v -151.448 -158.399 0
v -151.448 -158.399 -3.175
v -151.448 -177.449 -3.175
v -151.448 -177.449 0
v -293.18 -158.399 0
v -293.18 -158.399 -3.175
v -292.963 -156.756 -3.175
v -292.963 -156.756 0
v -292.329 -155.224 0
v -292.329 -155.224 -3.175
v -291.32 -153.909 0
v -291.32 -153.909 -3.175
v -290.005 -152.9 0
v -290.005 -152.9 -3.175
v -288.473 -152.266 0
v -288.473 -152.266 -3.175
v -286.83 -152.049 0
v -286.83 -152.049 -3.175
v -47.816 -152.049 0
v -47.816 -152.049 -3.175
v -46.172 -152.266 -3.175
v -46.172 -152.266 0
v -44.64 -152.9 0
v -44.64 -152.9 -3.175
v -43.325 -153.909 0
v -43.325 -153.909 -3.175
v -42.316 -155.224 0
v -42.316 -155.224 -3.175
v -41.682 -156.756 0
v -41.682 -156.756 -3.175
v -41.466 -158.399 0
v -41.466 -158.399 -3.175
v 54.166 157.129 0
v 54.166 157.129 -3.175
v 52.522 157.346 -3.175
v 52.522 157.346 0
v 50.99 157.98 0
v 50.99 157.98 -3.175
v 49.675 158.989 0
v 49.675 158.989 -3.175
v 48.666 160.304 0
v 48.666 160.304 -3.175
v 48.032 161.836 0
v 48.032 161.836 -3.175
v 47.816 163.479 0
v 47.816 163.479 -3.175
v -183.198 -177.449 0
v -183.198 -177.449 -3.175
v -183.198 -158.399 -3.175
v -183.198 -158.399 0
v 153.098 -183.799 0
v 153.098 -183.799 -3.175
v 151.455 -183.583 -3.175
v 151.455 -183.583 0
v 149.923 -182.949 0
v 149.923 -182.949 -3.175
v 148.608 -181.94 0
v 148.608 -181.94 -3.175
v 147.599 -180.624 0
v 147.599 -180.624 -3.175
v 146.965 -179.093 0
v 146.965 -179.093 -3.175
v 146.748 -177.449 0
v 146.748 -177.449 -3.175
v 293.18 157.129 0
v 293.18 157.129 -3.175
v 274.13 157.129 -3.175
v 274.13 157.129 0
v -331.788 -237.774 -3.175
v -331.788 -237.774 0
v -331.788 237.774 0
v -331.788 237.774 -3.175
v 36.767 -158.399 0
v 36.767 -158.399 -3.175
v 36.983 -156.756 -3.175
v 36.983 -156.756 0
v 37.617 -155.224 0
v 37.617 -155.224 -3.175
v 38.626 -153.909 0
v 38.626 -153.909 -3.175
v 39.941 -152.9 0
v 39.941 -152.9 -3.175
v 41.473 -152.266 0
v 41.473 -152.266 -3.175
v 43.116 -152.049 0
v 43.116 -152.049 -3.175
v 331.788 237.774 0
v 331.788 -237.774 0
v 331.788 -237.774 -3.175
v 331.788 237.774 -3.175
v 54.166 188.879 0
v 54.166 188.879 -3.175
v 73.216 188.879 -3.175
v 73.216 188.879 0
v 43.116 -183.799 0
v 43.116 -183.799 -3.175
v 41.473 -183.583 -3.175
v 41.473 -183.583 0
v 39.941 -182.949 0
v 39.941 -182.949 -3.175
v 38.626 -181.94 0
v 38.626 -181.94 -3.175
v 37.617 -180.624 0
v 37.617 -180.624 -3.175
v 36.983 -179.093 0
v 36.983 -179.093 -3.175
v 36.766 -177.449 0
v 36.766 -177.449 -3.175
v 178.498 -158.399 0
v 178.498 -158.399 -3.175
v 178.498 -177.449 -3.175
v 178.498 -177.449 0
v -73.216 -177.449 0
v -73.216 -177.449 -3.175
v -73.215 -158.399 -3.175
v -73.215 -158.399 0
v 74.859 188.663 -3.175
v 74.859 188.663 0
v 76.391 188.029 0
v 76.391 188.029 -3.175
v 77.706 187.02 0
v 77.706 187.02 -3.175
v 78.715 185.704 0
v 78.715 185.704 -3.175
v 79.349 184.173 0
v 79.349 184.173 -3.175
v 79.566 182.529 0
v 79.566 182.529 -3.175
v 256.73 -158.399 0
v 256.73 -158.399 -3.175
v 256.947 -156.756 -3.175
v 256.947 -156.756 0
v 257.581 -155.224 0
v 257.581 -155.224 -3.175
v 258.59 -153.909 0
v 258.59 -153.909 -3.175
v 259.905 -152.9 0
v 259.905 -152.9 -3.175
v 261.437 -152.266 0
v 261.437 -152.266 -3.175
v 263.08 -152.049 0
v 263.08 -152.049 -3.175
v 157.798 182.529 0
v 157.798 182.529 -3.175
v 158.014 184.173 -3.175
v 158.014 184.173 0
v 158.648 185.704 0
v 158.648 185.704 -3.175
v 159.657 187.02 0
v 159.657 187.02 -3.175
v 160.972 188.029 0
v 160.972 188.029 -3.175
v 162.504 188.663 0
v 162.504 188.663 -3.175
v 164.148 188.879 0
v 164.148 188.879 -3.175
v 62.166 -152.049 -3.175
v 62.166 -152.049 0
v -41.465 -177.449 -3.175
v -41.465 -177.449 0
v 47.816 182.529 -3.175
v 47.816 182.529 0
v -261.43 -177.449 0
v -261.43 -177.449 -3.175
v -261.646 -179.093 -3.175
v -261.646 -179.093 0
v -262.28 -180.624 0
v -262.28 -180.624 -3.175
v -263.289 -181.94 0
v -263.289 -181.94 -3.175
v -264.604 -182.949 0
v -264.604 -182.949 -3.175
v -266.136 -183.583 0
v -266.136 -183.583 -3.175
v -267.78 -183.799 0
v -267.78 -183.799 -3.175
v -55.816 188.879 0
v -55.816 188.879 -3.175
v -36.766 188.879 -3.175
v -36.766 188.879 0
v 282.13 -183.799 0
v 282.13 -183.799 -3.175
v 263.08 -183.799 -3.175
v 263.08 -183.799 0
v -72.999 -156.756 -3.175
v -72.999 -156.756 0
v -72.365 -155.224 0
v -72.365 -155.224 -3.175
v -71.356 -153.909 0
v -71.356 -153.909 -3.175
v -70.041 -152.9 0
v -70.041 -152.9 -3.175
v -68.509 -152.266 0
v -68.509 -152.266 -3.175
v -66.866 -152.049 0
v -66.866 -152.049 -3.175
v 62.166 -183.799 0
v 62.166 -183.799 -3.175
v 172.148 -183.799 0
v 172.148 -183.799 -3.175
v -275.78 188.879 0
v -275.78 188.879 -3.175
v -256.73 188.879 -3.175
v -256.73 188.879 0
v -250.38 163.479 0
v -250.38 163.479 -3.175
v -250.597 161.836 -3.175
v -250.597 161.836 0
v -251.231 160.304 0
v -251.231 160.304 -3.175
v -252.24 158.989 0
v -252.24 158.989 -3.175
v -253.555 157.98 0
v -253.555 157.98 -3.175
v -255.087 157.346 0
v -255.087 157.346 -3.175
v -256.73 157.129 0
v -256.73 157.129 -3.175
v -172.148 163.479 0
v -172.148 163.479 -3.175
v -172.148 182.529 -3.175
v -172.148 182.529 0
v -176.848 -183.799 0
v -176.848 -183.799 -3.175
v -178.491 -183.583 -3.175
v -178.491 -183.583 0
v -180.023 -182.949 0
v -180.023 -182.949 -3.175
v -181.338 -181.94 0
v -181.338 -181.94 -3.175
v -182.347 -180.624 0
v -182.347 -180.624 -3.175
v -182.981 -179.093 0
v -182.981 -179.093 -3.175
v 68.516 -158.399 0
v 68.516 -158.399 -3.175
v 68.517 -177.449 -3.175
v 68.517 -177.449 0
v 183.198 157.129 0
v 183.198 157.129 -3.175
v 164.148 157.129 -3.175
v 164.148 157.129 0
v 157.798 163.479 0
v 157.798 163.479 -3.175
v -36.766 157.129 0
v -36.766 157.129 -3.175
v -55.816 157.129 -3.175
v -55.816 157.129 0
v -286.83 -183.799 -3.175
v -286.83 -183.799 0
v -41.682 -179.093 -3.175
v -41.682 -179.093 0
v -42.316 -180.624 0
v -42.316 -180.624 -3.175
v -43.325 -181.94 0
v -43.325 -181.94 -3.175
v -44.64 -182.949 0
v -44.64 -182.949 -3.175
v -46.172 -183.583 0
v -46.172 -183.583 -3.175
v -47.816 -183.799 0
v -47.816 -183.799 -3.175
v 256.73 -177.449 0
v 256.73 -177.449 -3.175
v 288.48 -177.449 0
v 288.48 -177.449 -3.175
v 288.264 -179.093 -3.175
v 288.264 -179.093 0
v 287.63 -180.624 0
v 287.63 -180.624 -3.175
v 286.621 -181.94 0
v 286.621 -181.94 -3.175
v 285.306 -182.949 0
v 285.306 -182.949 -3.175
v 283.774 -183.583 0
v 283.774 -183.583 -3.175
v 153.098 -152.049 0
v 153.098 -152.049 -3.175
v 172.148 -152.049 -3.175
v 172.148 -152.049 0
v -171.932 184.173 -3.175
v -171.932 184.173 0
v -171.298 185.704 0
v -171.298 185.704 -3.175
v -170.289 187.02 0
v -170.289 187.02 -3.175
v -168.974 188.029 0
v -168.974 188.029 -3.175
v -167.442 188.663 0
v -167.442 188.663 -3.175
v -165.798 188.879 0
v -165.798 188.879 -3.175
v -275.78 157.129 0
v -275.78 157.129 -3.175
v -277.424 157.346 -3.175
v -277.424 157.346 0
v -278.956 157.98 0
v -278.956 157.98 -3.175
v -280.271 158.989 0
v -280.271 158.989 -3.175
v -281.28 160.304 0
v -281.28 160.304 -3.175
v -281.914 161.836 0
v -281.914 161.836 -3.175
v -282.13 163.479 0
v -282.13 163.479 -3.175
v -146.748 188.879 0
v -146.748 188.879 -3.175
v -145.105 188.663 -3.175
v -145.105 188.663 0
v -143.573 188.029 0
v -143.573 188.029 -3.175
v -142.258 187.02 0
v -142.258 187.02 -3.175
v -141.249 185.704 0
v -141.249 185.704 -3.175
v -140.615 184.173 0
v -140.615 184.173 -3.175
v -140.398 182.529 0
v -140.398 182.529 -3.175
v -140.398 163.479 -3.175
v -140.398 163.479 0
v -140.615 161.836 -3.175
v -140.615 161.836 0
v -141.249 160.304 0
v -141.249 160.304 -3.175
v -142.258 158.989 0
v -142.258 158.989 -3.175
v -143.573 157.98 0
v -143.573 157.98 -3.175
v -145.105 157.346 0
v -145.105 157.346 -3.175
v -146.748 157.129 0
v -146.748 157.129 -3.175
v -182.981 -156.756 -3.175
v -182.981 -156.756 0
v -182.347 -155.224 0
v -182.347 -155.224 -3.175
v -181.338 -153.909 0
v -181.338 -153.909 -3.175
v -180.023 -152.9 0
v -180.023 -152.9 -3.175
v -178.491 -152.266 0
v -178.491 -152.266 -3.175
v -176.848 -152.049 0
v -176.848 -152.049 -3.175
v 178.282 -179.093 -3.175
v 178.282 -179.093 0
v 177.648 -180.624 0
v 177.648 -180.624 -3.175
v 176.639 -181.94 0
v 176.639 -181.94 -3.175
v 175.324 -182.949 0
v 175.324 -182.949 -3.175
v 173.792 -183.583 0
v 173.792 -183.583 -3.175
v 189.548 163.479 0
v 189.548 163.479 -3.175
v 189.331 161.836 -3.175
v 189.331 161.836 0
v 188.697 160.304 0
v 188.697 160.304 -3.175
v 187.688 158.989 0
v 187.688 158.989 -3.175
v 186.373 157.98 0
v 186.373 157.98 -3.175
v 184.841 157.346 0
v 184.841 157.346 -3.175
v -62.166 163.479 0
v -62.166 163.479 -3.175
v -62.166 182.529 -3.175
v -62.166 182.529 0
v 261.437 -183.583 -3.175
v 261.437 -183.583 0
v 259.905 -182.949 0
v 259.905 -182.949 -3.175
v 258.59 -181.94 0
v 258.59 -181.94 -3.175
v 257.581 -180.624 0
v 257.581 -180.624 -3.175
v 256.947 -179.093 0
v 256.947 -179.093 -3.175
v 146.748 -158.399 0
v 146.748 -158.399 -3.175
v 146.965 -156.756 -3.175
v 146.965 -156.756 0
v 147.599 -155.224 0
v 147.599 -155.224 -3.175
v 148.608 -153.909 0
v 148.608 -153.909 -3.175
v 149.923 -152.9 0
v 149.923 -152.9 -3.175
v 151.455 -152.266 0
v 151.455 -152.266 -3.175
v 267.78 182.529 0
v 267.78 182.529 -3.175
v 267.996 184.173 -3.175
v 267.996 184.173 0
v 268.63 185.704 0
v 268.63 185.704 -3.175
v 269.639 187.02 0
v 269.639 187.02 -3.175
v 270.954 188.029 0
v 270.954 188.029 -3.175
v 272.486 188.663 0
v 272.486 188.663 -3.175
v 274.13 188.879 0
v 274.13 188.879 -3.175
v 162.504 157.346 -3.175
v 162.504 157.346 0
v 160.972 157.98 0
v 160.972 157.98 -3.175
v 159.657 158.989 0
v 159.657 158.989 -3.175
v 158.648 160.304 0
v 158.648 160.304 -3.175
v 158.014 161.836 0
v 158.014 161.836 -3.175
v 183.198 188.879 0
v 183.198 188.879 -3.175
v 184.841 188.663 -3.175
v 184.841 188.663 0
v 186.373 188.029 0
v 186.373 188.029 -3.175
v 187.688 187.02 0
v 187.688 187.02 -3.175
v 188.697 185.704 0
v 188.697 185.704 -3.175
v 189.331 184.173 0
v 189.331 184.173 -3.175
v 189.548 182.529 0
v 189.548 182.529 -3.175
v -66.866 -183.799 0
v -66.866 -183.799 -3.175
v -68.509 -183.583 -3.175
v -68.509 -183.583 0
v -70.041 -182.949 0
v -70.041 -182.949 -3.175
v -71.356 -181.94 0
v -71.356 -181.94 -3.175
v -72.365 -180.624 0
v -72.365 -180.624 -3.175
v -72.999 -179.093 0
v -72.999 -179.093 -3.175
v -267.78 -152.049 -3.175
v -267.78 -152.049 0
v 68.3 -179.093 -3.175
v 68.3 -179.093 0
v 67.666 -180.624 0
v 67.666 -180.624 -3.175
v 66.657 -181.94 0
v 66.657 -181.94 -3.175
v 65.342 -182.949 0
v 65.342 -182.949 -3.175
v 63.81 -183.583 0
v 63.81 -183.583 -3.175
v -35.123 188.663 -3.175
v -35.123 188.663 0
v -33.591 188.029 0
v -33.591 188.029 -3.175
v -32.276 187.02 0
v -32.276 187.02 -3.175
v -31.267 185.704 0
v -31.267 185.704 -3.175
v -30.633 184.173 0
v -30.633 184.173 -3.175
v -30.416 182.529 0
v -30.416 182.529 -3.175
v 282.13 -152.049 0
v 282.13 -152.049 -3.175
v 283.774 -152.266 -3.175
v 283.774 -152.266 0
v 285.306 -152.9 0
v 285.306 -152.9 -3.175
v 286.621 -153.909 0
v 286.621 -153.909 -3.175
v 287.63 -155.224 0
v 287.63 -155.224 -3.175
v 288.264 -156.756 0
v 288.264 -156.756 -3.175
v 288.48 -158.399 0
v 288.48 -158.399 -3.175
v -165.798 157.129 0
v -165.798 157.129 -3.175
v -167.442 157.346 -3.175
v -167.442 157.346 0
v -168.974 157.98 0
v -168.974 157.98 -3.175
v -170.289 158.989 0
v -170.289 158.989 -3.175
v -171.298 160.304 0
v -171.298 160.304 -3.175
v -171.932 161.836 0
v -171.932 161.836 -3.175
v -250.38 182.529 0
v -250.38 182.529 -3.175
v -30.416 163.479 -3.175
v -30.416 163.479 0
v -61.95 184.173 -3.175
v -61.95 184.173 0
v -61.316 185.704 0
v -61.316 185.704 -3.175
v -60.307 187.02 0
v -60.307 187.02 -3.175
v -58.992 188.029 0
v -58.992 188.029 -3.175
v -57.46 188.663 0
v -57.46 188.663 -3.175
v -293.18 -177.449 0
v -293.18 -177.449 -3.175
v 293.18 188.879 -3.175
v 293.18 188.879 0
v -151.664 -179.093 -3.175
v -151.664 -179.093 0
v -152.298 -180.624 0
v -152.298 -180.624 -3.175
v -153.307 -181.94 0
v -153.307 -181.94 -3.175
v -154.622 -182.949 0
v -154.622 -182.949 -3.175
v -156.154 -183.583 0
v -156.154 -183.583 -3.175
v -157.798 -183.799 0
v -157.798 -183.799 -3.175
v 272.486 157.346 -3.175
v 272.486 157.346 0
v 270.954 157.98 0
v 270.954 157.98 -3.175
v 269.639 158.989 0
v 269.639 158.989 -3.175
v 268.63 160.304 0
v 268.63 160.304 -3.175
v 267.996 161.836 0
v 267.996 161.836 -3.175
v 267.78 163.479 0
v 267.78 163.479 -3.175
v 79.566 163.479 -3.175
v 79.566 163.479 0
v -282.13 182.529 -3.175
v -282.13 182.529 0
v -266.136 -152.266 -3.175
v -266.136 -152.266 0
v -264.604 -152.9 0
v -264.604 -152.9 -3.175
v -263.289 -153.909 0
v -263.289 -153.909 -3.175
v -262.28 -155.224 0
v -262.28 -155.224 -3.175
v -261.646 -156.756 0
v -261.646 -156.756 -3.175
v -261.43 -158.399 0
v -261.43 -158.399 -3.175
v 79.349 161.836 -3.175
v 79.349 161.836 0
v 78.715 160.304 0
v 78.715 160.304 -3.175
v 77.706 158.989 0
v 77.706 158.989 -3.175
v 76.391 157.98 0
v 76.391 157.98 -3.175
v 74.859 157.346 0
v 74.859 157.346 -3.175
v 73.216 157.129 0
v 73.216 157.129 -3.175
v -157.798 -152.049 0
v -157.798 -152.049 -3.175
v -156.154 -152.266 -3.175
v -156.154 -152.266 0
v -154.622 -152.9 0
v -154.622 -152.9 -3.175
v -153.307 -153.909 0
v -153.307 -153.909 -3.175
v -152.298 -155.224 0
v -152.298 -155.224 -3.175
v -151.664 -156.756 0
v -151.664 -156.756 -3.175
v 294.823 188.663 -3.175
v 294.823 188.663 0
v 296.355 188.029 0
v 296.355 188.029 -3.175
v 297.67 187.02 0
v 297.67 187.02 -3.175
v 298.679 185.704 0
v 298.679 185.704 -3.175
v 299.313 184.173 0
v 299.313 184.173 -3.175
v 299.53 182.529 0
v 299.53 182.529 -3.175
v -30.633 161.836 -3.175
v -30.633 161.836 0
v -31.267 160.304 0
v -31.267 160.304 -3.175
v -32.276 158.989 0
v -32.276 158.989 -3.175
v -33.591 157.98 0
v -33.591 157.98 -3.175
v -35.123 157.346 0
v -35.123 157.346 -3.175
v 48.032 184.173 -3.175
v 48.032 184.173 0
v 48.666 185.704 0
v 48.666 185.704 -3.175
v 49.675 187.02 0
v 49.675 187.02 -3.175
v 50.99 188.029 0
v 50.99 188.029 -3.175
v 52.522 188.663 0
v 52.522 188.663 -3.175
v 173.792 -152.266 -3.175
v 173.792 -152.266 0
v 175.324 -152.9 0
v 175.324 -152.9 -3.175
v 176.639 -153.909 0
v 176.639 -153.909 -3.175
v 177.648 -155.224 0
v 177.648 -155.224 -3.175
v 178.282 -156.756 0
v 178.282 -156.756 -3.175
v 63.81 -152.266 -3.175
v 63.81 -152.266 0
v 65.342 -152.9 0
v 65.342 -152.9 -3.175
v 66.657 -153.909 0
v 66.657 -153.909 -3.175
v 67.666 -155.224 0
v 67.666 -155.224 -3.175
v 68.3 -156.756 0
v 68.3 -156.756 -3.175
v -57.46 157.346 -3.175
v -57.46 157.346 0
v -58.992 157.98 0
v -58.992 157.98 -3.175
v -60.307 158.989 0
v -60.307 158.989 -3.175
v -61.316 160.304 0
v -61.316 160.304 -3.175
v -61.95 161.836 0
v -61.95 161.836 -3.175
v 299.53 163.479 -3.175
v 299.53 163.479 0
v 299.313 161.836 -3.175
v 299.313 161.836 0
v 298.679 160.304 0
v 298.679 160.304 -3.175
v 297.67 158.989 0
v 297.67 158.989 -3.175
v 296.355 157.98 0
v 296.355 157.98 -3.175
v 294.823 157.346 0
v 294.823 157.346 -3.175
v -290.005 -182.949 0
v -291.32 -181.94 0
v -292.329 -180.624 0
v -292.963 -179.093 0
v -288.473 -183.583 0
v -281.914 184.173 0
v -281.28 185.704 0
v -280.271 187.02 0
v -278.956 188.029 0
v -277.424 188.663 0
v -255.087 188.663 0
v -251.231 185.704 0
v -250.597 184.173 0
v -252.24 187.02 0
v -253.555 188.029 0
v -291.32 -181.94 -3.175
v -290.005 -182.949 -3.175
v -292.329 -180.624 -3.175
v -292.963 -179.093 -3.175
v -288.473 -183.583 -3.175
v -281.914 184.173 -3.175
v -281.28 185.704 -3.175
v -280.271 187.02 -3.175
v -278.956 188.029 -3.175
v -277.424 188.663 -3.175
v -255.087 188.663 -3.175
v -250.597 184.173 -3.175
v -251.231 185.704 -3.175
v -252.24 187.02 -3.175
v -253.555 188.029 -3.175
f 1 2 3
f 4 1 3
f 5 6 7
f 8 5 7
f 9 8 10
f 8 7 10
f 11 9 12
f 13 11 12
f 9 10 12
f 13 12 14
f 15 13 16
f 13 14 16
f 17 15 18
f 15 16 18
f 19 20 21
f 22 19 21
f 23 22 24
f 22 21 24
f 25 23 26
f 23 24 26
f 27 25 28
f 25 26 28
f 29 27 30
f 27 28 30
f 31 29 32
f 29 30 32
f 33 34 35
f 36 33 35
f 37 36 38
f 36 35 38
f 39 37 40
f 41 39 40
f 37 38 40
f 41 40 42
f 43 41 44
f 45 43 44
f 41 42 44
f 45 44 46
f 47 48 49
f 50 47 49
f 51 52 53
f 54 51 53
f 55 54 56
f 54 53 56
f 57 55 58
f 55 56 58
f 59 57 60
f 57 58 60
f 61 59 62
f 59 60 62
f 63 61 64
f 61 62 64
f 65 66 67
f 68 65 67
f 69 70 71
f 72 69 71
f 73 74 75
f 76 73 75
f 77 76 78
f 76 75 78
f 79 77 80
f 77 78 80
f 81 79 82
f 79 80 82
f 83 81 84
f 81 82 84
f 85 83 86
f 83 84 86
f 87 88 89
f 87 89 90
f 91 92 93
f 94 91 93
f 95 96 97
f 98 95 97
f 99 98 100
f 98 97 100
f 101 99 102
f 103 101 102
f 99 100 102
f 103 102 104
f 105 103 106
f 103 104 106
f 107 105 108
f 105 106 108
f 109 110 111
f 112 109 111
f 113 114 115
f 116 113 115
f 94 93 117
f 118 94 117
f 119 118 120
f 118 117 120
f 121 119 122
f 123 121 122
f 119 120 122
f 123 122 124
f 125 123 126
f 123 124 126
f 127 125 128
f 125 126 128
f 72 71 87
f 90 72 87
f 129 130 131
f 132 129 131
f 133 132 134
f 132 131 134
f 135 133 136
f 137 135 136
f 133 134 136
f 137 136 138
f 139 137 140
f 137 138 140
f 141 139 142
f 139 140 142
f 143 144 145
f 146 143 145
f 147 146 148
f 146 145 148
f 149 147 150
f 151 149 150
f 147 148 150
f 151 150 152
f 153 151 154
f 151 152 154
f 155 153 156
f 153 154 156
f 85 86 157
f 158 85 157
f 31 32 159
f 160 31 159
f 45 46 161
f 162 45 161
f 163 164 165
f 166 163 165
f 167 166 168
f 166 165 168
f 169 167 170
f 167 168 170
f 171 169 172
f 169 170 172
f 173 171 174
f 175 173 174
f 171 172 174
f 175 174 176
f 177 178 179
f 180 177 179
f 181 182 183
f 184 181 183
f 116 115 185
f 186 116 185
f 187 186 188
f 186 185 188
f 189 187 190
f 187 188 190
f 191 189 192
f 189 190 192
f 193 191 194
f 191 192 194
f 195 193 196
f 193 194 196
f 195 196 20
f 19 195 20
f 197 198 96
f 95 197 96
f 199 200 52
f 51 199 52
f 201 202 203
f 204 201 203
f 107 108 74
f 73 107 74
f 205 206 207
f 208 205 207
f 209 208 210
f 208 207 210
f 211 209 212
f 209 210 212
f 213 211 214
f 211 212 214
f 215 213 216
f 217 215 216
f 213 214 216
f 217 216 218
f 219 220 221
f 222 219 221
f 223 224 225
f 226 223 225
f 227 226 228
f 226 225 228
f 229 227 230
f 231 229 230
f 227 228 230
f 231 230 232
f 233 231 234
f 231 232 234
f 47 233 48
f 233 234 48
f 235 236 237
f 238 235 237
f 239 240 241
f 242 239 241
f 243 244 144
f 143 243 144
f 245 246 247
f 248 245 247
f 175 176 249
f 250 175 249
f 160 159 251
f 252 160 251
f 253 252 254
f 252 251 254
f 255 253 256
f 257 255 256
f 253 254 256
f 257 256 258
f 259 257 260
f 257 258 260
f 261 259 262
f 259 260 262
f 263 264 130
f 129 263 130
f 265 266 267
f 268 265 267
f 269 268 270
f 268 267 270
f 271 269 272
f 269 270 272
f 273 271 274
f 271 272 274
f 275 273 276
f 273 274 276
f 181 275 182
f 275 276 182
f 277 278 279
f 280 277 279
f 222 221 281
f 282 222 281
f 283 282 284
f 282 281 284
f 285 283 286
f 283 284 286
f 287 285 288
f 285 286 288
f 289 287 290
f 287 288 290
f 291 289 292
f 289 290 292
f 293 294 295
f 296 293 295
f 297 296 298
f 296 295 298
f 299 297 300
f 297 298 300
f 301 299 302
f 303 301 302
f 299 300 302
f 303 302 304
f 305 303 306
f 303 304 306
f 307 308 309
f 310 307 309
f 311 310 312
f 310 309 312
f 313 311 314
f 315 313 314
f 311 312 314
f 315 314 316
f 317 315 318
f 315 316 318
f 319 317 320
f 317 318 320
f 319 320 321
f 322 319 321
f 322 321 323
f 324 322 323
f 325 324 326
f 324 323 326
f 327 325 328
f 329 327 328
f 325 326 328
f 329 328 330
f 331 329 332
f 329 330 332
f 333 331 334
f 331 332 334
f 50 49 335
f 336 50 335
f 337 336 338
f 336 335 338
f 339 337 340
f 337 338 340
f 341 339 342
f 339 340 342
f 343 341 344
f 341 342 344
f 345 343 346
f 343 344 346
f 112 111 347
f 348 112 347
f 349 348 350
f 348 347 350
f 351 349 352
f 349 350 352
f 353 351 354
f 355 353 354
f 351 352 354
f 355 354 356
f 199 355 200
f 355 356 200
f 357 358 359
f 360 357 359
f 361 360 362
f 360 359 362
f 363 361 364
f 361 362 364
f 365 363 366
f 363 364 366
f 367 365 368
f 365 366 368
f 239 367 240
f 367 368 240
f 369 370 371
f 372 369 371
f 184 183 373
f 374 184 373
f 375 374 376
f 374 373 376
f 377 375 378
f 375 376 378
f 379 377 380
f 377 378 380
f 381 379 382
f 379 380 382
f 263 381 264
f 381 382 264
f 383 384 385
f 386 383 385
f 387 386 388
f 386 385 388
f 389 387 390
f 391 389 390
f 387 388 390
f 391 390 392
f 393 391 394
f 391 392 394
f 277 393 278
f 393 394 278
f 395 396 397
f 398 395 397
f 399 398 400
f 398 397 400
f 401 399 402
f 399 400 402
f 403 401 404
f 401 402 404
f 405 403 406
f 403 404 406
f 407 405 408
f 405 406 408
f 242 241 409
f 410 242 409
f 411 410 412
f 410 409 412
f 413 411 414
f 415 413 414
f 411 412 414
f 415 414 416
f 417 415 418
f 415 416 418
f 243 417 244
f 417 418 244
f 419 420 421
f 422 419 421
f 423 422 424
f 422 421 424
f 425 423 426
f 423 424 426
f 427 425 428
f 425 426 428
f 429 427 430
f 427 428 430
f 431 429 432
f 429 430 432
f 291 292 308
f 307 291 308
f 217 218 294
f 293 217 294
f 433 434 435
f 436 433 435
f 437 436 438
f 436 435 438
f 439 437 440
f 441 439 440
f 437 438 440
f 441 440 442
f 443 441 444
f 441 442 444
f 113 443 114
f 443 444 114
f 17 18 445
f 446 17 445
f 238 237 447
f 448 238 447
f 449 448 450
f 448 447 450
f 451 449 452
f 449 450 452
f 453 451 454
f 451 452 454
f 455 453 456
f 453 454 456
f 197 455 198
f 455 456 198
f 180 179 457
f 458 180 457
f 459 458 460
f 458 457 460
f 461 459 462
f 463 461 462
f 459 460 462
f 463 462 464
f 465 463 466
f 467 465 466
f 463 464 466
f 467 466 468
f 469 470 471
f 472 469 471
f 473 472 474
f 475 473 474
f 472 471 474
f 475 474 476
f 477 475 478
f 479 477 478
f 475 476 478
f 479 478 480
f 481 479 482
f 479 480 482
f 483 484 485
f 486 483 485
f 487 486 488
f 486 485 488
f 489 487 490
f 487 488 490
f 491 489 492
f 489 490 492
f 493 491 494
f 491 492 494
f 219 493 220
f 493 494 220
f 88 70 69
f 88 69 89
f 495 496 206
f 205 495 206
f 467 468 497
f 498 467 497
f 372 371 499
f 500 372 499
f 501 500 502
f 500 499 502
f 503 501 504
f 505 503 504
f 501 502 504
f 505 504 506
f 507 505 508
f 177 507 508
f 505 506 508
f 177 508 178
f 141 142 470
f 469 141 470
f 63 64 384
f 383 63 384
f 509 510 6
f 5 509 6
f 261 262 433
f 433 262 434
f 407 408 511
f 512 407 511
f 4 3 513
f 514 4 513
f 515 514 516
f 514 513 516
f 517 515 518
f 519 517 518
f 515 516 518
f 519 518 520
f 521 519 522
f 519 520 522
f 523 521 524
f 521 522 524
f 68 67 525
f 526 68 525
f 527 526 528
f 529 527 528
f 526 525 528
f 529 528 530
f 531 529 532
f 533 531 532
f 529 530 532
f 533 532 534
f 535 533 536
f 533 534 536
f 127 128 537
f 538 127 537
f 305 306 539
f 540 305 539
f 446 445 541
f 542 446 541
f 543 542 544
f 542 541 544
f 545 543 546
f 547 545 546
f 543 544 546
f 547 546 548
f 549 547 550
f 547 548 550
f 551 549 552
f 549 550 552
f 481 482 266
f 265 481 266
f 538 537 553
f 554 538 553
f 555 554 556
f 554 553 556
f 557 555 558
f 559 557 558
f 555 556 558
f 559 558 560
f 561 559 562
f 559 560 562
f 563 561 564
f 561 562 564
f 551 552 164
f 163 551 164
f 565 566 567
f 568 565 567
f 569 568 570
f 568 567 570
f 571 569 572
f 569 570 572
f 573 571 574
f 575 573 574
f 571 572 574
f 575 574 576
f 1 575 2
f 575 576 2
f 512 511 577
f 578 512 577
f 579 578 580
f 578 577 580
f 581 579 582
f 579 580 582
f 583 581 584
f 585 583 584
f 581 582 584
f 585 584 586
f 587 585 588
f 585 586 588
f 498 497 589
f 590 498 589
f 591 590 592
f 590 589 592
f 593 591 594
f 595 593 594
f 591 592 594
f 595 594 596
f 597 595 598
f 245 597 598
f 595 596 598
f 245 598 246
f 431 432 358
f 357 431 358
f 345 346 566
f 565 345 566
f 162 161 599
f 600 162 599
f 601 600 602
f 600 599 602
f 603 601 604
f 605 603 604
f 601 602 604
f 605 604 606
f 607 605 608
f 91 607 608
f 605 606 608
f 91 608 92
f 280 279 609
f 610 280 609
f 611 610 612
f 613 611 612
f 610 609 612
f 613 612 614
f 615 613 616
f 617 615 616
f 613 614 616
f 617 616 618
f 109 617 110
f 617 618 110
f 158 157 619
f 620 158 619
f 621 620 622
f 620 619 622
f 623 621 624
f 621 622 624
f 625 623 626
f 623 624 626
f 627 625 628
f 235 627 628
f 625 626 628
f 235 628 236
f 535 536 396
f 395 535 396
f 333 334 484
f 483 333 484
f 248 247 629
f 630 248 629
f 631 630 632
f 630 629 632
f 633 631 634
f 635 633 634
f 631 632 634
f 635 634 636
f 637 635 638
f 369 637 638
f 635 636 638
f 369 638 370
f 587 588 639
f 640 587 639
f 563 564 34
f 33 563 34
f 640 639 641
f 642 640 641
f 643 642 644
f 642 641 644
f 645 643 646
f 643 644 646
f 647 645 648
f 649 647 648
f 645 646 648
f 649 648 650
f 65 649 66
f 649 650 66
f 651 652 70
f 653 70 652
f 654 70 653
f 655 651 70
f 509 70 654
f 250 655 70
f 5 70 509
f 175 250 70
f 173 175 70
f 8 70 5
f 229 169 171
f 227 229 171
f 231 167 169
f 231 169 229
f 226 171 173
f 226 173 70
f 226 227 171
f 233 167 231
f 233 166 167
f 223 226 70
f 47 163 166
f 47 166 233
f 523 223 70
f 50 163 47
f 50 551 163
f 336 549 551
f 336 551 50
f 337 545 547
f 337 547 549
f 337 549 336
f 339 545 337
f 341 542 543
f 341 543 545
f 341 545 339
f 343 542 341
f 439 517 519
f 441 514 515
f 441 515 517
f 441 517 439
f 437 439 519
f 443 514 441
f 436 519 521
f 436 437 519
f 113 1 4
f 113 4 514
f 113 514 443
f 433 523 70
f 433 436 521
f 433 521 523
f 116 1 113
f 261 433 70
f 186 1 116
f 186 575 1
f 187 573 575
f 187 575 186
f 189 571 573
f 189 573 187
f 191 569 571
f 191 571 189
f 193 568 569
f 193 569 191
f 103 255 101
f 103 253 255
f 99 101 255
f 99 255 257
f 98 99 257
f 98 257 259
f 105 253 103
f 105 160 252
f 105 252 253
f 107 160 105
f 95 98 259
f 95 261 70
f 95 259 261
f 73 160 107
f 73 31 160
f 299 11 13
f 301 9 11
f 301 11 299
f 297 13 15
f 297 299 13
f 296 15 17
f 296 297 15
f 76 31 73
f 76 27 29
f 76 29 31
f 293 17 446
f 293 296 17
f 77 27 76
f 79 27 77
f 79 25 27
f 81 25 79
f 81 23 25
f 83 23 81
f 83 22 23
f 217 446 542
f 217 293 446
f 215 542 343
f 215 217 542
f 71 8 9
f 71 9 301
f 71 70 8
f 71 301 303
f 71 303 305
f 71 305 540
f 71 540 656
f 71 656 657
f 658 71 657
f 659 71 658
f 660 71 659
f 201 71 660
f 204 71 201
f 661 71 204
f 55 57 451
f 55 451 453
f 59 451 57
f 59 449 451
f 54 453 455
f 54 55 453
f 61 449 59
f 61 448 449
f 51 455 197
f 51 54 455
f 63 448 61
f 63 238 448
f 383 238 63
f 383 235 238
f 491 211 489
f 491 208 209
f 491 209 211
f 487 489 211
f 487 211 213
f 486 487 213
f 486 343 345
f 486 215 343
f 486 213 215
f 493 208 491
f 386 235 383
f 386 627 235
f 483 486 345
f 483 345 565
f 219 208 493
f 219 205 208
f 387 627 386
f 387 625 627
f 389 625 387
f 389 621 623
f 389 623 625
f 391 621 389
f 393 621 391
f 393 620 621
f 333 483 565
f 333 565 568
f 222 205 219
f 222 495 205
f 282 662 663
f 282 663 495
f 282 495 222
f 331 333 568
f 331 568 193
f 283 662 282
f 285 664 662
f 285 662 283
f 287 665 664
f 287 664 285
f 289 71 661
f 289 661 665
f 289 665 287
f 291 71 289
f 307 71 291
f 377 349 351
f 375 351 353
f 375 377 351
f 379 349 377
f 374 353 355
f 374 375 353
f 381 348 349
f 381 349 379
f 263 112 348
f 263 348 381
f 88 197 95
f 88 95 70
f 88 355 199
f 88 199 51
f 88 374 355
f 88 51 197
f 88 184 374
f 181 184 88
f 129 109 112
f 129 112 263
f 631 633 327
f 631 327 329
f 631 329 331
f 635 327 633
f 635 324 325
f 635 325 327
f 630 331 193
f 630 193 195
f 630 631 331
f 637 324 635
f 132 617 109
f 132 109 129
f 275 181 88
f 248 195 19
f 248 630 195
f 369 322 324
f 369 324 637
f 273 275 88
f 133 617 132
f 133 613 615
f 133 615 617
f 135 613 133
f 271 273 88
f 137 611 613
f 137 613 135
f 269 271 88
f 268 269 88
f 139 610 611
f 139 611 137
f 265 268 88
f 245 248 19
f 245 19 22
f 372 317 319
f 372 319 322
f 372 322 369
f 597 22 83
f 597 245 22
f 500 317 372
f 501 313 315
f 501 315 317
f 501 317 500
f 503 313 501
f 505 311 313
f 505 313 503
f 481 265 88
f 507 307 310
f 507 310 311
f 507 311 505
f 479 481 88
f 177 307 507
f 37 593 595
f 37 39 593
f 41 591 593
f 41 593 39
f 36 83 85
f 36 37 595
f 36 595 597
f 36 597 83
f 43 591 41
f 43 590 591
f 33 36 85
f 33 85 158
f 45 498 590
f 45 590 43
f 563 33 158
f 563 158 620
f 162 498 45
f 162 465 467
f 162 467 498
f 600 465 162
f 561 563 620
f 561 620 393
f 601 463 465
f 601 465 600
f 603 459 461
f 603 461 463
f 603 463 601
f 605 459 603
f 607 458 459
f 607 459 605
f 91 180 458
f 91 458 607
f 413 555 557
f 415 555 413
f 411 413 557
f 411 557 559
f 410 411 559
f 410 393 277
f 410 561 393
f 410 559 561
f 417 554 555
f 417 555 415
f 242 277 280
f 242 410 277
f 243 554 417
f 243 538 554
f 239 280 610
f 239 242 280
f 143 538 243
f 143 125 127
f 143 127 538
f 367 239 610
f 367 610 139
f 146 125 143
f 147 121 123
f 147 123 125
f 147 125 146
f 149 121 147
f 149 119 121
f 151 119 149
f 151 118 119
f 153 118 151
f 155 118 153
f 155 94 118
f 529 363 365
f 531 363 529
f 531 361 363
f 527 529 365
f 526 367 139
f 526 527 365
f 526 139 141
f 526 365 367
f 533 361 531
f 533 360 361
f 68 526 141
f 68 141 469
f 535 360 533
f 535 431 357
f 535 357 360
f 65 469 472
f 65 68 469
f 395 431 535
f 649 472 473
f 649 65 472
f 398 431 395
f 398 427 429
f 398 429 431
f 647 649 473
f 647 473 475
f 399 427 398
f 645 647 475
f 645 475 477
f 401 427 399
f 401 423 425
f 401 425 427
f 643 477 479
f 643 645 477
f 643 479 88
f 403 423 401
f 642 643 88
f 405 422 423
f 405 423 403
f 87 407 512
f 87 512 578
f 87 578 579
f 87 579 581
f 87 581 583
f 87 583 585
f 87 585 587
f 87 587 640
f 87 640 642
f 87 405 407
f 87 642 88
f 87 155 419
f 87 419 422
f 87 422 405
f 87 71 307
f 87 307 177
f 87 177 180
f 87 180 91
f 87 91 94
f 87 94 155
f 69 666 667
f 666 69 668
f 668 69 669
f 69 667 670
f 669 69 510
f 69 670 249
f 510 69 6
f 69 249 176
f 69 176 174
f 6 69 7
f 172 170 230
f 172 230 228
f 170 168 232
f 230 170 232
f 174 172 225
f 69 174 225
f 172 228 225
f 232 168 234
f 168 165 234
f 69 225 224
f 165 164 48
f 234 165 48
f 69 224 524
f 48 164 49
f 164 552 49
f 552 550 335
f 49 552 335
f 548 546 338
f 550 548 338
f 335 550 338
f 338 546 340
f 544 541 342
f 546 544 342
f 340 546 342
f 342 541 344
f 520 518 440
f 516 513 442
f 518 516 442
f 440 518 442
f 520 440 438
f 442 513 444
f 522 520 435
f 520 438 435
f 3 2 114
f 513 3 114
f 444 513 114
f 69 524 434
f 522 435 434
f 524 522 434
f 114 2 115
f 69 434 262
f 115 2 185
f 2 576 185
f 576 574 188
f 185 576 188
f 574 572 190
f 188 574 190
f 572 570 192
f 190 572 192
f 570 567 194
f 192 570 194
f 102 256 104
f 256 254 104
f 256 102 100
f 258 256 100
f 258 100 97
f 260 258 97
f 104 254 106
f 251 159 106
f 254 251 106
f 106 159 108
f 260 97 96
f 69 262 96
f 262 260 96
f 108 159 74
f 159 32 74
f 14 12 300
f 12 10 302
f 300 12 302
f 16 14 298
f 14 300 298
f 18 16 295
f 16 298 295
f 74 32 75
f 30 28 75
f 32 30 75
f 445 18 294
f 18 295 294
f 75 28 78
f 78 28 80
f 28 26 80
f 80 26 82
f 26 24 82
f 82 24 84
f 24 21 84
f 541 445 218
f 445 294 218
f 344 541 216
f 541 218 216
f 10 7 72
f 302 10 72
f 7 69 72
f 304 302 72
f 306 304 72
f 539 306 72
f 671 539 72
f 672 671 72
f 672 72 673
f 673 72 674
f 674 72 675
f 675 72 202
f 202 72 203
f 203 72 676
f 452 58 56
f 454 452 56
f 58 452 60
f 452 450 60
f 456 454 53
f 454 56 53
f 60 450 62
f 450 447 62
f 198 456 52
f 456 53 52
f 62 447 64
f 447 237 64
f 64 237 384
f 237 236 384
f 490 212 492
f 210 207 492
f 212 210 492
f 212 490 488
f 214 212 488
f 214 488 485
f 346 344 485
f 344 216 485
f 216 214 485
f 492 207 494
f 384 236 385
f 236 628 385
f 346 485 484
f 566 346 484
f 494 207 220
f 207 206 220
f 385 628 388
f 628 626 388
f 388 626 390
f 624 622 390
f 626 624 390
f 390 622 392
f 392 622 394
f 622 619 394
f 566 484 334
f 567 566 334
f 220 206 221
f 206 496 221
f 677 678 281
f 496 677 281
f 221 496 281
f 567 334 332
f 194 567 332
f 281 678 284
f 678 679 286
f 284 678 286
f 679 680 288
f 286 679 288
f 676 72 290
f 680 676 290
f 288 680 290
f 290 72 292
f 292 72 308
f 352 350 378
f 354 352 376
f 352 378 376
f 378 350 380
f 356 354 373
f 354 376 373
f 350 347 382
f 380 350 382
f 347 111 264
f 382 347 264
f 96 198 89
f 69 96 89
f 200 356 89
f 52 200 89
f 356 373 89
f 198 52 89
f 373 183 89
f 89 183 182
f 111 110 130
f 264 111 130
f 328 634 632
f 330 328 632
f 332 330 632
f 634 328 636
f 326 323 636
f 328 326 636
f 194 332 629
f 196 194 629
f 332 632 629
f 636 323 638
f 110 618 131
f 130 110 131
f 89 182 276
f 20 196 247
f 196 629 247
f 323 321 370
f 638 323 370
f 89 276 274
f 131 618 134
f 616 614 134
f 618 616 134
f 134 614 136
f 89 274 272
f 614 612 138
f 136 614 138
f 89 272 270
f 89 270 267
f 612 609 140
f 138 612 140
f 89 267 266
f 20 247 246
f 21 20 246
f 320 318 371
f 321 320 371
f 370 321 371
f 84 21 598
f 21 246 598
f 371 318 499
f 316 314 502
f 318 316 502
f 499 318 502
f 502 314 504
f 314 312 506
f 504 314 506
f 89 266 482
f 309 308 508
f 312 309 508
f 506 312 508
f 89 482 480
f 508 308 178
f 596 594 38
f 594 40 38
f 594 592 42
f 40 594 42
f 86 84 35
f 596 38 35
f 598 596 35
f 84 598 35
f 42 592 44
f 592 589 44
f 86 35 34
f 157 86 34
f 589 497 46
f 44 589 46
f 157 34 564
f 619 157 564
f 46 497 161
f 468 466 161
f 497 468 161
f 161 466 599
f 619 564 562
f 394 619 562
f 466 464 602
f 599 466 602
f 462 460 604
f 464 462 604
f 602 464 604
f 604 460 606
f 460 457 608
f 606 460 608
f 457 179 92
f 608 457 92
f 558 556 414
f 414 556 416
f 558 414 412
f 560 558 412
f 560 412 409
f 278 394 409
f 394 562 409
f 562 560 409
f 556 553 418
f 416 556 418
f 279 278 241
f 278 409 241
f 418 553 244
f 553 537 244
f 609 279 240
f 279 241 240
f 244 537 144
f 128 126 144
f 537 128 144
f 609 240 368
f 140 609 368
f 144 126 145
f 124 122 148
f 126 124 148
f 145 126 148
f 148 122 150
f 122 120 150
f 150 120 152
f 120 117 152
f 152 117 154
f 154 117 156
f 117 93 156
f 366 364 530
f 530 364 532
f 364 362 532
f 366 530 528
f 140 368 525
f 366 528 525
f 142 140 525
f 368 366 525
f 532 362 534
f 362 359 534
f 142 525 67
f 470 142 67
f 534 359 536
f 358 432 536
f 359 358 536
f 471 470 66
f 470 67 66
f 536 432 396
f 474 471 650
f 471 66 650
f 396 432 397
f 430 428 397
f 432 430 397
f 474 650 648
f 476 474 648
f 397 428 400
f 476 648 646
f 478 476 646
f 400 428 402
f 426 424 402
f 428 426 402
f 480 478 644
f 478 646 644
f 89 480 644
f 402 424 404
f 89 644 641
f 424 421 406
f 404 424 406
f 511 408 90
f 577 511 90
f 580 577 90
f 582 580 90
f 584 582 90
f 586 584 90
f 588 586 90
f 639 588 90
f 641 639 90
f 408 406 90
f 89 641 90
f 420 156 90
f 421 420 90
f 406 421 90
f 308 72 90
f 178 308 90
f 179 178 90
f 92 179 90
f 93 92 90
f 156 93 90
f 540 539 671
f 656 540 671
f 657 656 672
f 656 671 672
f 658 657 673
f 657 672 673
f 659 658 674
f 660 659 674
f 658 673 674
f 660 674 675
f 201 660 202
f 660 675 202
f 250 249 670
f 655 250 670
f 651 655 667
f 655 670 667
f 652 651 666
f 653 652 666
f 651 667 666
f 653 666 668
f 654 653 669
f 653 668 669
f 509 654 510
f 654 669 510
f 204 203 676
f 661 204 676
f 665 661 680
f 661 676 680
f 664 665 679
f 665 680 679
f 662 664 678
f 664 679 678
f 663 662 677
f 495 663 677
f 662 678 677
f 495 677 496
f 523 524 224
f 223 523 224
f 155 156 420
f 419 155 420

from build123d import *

# Parameters (mm, degrees)
SKETCH1_W               = 663.575
SKETCH1_H               = 475.54896
BASE_FLANGE1_DEPTH      = 3.175
CUT_EXTRUDE1_DEPTH      = 409.203048887
CUT_EXTRUDE1_DEPTH_BACK = 409.203048887


# Sheet-metal steps are written as plain solids
with BuildPart() as part:
    # Sketch1 → Base-Flange1 (new body)
    with BuildSketch(Plane.XY):
        Rectangle(SKETCH1_W, SKETCH1_H)
    extrude(amount=-BASE_FLANGE1_DEPTH)

    # Sketch6 → Cut-Extrude1 (cut, two sides: drawn at the far end of the back side and taken through both)
    with BuildSketch(Plane.XY.offset(-CUT_EXTRUDE1_DEPTH_BACK)):
        with BuildLine():
            Line((263.0805, -152.04948), (282.1305, -152.04948))
            ThreePointArc((282.1305, -152.04948), (286.620628061, -153.909351939), (288.4805, -158.39948))
            Line((288.4805, -158.39948), (288.4805, -177.44948))
            ThreePointArc((288.4805, -177.44948), (286.620628061, -181.939608061), (282.1305, -183.79948))
            Line((282.1305, -183.79948), (263.0805, -183.79948))
            ThreePointArc((263.0805, -183.79948), (258.590371939, -181.939608061), (256.7305, -177.44948))
            Line((256.7305, -177.44948), (256.7305, -158.39948))
            ThreePointArc((256.7305, -158.39948), (258.590371939, -153.909351939), (263.0805, -152.04948))
        make_face()
        with BuildLine():
            Line((153.0985, -152.04948), (172.1485, -152.04948))
            ThreePointArc((172.1485, -152.04948), (176.638628061, -153.909351939), (178.4985, -158.39948))
            Line((178.4985, -158.39948), (178.4985, -177.44948))
            ThreePointArc((178.4985, -177.44948), (176.638628061, -181.939608061), (172.1485, -183.79948))
            Line((172.1485, -183.79948), (153.0985, -183.79948))
            ThreePointArc((153.0985, -183.79948), (148.608371939, -181.939608061), (146.7485, -177.44948))
            Line((146.7485, -177.44948), (146.7485, -158.39948))
            ThreePointArc((146.7485, -158.39948), (148.608371939, -153.909351939), (153.0985, -152.04948))
        make_face()
        with BuildLine():
            Line((43.1165, -152.04948), (62.1665, -152.04948))
            ThreePointArc((62.1665, -152.04948), (66.656628061, -153.909351939), (68.5165, -158.39948))
            Line((68.5165, -158.39948), (68.5165, -177.44948))
            ThreePointArc((68.5165, -177.44948), (66.656628061, -181.939608061), (62.1665, -183.79948))
            Line((62.1665, -183.79948), (43.1165, -183.79948))
            ThreePointArc((43.1165, -183.79948), (38.626371939, -181.939608061), (36.7665, -177.44948))
            Line((36.7665, -177.44948), (36.7665, -158.39948))
            ThreePointArc((36.7665, -158.39948), (38.626371939, -153.909351939), (43.1165, -152.04948))
        make_face()
        with BuildLine():
            Line((-66.8655, -152.04948), (-47.8155, -152.04948))
            ThreePointArc((-47.8155, -152.04948), (-43.325371939, -153.909351939), (-41.4655, -158.39948))
            Line((-41.4655, -158.39948), (-41.4655, -177.44948))
            ThreePointArc((-41.4655, -177.44948), (-43.325371939, -181.939608061), (-47.8155, -183.79948))
            Line((-47.8155, -183.79948), (-66.8655, -183.79948))
            ThreePointArc((-66.8655, -183.79948), (-71.355628061, -181.939608061), (-73.2155, -177.44948))
            Line((-73.2155, -177.44948), (-73.2155, -158.39948))
            ThreePointArc((-73.2155, -158.39948), (-71.355628061, -153.909351939), (-66.8655, -152.04948))
        make_face()
        with BuildLine():
            Line((-176.8475, -152.04948), (-157.7975, -152.04948))
            ThreePointArc((-157.7975, -152.04948), (-153.307371939, -153.909351939), (-151.4475, -158.39948))
            Line((-151.4475, -158.39948), (-151.4475, -177.44948))
            ThreePointArc((-151.4475, -177.44948), (-153.307371939, -181.939608061), (-157.7975, -183.79948))
            Line((-157.7975, -183.79948), (-176.8475, -183.79948))
            ThreePointArc((-176.8475, -183.79948), (-181.337628061, -181.939608061), (-183.1975, -177.44948))
            Line((-183.1975, -177.44948), (-183.1975, -158.39948))
            ThreePointArc((-183.1975, -158.39948), (-181.337628061, -153.909351939), (-176.8475, -152.04948))
        make_face()
        with BuildLine():
            Line((-286.8295, -152.04948), (-267.7795, -152.04948))
            ThreePointArc((-267.7795, -152.04948), (-263.289371939, -153.909351939), (-261.4295, -158.39948))
            Line((-261.4295, -158.39948), (-261.4295, -177.44948))
            ThreePointArc((-261.4295, -177.44948), (-263.289371939, -181.939608061), (-267.7795, -183.79948))
            Line((-267.7795, -183.79948), (-286.8295, -183.79948))
            ThreePointArc((-286.8295, -183.79948), (-291.319628061, -181.939608061), (-293.1795, -177.44948))
            Line((-293.1795, -177.44948), (-293.1795, -158.39948))
            ThreePointArc((-293.1795, -158.39948), (-291.319628061, -153.909351939), (-286.8295, -152.04948))
        make_face()
        with BuildLine():
            Line((-275.7805, 188.87948), (-256.7305, 188.87948))
            ThreePointArc((-256.7305, 188.87948), (-252.240371939, 187.019608061), (-250.3805, 182.52948))
            Line((-250.3805, 182.52948), (-250.3805, 163.47948))
            ThreePointArc((-250.3805, 163.47948), (-252.240371939, 158.989351939), (-256.7305, 157.12948))
            Line((-256.7305, 157.12948), (-275.7805, 157.12948))
            ThreePointArc((-275.7805, 157.12948), (-280.270628061, 158.989351939), (-282.1305, 163.47948))
            Line((-282.1305, 163.47948), (-282.1305, 182.52948))
            ThreePointArc((-282.1305, 182.52948), (-280.270628061, 187.019608061), (-275.7805, 188.87948))
        make_face()
        with BuildLine():
            Line((-165.7985, 188.87948), (-146.7485, 188.87948))
            ThreePointArc((-146.7485, 188.87948), (-142.258371939, 187.019608061), (-140.3985, 182.52948))
            Line((-140.3985, 182.52948), (-140.3985, 163.47948))
            ThreePointArc((-140.3985, 163.47948), (-142.258371939, 158.989351939), (-146.7485, 157.12948))
            Line((-146.7485, 157.12948), (-165.7985, 157.12948))
            ThreePointArc((-165.7985, 157.12948), (-170.288628061, 158.989351939), (-172.1485, 163.47948))
            Line((-172.1485, 163.47948), (-172.1485, 182.52948))
            ThreePointArc((-172.1485, 182.52948), (-170.288628061, 187.019608061), (-165.7985, 188.87948))
        make_face()
        with BuildLine():
            Line((-55.8165, 188.87948), (-36.7665, 188.87948))
            ThreePointArc((-36.7665, 188.87948), (-32.276371939, 187.019608061), (-30.4165, 182.52948))
            Line((-30.4165, 182.52948), (-30.4165, 163.47948))
            ThreePointArc((-30.4165, 163.47948), (-32.276371939, 158.989351939), (-36.7665, 157.12948))
            Line((-36.7665, 157.12948), (-55.8165, 157.12948))
            ThreePointArc((-55.8165, 157.12948), (-60.306628061, 158.989351939), (-62.1665, 163.47948))
            Line((-62.1665, 163.47948), (-62.1665, 182.52948))
            ThreePointArc((-62.1665, 182.52948), (-60.306628061, 187.019608061), (-55.8165, 188.87948))
        make_face()
        with BuildLine():
            Line((54.1655, 188.87948), (73.2155, 188.87948))
            ThreePointArc((73.2155, 188.87948), (77.705628061, 187.019608061), (79.5655, 182.52948))
            Line((79.5655, 182.52948), (79.5655, 163.47948))
            ThreePointArc((79.5655, 163.47948), (77.705628061, 158.989351939), (73.2155, 157.12948))
            Line((73.2155, 157.12948), (54.1655, 157.12948))
            ThreePointArc((54.1655, 157.12948), (49.675371939, 158.989351939), (47.8155, 163.47948))
            Line((47.8155, 163.47948), (47.8155, 182.52948))
            ThreePointArc((47.8155, 182.52948), (49.675371939, 187.019608061), (54.1655, 188.87948))
        make_face()
        with BuildLine():
            Line((164.1475, 188.87948), (183.1975, 188.87948))
            ThreePointArc((183.1975, 188.87948), (187.687628061, 187.019608061), (189.5475, 182.52948))
            Line((189.5475, 182.52948), (189.5475, 163.47948))
            ThreePointArc((189.5475, 163.47948), (187.687628061, 158.989351939), (183.1975, 157.12948))
            Line((183.1975, 157.12948), (164.1475, 157.12948))
            ThreePointArc((164.1475, 157.12948), (159.657371939, 158.989351939), (157.7975, 163.47948))
            Line((157.7975, 163.47948), (157.7975, 182.52948))
            ThreePointArc((157.7975, 182.52948), (159.657371939, 187.019608061), (164.1475, 188.87948))
        make_face()
        with BuildLine():
            Line((274.1295, 188.87948), (293.1795, 188.87948))
            ThreePointArc((293.1795, 188.87948), (297.669628061, 187.019608061), (299.5295, 182.52948))
            Line((299.5295, 182.52948), (299.5295, 163.47948))
            ThreePointArc((299.5295, 163.47948), (297.669628061, 158.989351939), (293.1795, 157.12948))
            Line((293.1795, 157.12948), (274.1295, 157.12948))
            ThreePointArc((274.1295, 157.12948), (269.639371939, 158.989351939), (267.7795, 163.47948))
            Line((267.7795, 163.47948), (267.7795, 182.52948))
            ThreePointArc((267.7795, 182.52948), (269.639371939, 187.019608061), (274.1295, 188.87948))
        make_face()
    extrude(amount=CUT_EXTRUDE1_DEPTH + CUT_EXTRUDE1_DEPTH_BACK, mode=Mode.SUBTRACT)


solid = part.part
